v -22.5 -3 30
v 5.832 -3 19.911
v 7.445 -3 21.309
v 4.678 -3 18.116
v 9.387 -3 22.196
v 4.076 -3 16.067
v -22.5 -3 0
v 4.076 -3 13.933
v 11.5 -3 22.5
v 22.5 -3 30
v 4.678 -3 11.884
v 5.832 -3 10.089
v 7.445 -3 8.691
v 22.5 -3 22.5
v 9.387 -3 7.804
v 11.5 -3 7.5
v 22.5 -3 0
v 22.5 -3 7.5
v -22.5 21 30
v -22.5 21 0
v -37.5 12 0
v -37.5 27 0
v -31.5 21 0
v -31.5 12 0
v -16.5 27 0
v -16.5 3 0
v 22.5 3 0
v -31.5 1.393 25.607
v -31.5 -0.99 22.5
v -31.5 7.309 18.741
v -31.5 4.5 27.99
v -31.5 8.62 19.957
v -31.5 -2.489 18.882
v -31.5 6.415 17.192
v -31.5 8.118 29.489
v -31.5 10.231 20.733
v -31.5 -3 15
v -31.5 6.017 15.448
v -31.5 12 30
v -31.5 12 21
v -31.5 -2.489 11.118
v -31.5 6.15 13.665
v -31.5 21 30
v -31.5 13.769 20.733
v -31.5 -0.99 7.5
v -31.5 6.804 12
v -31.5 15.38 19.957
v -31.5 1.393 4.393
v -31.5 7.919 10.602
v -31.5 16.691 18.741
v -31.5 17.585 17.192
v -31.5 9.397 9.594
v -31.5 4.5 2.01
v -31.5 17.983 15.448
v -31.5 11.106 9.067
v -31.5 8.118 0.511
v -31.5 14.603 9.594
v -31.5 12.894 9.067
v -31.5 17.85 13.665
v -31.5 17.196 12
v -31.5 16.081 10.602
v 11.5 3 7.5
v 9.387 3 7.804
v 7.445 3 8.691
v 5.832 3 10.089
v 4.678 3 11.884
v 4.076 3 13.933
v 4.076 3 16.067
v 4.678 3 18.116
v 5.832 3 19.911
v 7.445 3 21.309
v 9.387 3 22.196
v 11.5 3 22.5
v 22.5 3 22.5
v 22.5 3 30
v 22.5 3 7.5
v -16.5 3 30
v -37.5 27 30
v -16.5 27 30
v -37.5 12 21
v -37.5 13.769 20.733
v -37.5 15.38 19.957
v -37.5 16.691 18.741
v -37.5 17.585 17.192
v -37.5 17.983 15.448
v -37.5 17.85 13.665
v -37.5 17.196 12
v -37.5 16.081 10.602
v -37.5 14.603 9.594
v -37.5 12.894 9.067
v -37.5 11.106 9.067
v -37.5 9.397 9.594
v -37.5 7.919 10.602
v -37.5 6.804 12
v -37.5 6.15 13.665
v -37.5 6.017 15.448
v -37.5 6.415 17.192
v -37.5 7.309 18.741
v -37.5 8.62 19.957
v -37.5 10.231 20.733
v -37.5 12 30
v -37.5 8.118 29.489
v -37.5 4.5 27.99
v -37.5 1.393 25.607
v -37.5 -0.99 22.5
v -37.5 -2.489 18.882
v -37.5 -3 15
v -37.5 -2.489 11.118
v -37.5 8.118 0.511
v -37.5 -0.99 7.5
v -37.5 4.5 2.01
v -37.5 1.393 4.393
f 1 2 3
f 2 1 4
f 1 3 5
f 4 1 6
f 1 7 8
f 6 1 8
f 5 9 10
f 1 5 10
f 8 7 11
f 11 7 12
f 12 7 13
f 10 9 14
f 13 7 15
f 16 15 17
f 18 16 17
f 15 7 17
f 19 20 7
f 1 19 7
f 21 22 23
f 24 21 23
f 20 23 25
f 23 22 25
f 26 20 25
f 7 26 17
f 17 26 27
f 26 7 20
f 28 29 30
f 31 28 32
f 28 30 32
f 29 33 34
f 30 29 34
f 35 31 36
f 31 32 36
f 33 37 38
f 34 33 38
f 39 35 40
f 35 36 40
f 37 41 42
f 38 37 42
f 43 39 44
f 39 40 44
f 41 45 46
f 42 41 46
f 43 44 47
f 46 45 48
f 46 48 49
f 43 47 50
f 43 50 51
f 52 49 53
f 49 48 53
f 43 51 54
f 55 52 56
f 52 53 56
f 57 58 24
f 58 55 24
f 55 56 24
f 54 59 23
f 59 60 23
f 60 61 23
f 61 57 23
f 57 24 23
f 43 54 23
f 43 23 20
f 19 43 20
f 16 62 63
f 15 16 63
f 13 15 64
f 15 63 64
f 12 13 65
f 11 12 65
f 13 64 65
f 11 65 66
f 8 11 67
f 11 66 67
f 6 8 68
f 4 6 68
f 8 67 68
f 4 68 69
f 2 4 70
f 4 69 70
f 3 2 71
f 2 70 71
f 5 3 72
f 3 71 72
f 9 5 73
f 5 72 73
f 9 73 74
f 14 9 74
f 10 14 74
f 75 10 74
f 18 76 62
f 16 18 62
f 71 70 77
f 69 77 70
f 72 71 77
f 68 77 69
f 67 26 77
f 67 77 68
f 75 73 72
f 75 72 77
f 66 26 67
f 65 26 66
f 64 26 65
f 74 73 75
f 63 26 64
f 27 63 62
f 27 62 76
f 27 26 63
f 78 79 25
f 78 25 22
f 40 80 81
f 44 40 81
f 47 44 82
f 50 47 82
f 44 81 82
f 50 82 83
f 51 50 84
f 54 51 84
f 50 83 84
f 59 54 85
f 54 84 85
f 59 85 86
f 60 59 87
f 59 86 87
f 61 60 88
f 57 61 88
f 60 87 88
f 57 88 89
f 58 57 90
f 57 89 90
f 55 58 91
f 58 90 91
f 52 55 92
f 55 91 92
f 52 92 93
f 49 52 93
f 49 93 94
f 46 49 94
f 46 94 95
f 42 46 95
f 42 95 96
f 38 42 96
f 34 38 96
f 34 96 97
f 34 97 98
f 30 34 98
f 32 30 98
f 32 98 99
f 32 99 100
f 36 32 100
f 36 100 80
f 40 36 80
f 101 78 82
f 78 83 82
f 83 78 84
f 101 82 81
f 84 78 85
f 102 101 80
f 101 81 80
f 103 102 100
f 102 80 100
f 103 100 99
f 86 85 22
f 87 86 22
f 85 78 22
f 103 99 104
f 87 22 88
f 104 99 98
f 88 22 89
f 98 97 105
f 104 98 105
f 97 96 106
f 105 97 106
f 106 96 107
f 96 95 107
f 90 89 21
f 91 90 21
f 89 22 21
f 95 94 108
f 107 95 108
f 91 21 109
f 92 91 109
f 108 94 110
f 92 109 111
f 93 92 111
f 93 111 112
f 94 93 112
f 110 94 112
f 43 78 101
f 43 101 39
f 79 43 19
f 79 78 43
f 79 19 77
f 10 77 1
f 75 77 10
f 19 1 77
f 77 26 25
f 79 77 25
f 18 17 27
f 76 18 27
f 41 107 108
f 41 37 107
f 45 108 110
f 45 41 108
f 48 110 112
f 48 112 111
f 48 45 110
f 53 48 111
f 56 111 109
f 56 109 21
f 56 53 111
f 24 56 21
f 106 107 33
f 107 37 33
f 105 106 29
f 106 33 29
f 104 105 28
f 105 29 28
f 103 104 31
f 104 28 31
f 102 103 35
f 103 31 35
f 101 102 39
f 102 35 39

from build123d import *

# Parameters (mm, degrees)
SKETCH_1_W          = 6
SKETCH_1_H          = 24
SKETCH_1_W_2        = 45
SKETCH_1_H_2        = 6
EXTRUDE_1_DEPTH     = 30
FILLET_1_R          = 15
CUT_EXTRUDE_1_REACH = 74.312
SKETCH_2_R          = 6
CUT_EXTRUDE_2_DEPTH = 54.686590505


with BuildPart() as part:
    # Эскиз1 → Бобышка-Вытянуть1 (new body)
    with BuildSketch(Plane.XY):
        with Locations((-34.5, 9)):
            Rectangle(SKETCH_1_W, SKETCH_1_H)
        Polygon((-31.5, 21), (-22.5, 21), (-22.5, 27), (-37.5, 27), (-37.5, 21), align=None)
        Polygon((-22.5, 21), (-22.5, 3), (-16.5, 3), (-16.5, 27), (-22.5, 27), align=None)
        Rectangle(SKETCH_1_W_2, SKETCH_1_H_2)
    extrude(amount=EXTRUDE_1_DEPTH)

    # Скругление1
    fillet_1_edges = [part.edges().sort_by_distance(p)[0] for p in [
        (-34.5, -3, 0),
        (-34.5, -3, 30),
    ]]
    fillet(fillet_1_edges, radius=FILLET_1_R - 0.0001)  # a hair under: the kernel refuses the full size

    # Эскиз2 → Вырез-Вытянуть1 (cut, up to next)
    with BuildSketch(Plane.ZY.offset(37.5), mode=Mode.PRIVATE) as cut_extrude_1_sk1:
        with Locations((15, 12)):
            Circle(SKETCH_2_R)
    cut_extrude_1_tool1 = extrude(cut_extrude_1_sk1.sketch, amount=-CUT_EXTRUDE_1_REACH, mode=Mode.PRIVATE) & part.part
    add(cut_extrude_1_tool1.solids().sort_by_distance((-37.5, 12, 15))[0], mode=Mode.SUBTRACT)

    # Эскиз3 → Вырез-Вытянуть2 (cut, through all)
    with BuildSketch(Plane(origin=(0, 3, 0), x_dir=(1, 0, 0), z_dir=(0, 1, 0))):
        with BuildLine():
            Line((22.5, -7.5), (11.5, -7.5))
            ThreePointArc((11.5, -7.5), (4, -15), (11.5, -22.5))
            Line((11.5, -22.5), (22.5, -22.5))
            Line((22.5, -22.5), (22.5, -7.5))
        make_face()
    extrude(amount=-CUT_EXTRUDE_2_DEPTH, mode=Mode.SUBTRACT)


solid = part.part
